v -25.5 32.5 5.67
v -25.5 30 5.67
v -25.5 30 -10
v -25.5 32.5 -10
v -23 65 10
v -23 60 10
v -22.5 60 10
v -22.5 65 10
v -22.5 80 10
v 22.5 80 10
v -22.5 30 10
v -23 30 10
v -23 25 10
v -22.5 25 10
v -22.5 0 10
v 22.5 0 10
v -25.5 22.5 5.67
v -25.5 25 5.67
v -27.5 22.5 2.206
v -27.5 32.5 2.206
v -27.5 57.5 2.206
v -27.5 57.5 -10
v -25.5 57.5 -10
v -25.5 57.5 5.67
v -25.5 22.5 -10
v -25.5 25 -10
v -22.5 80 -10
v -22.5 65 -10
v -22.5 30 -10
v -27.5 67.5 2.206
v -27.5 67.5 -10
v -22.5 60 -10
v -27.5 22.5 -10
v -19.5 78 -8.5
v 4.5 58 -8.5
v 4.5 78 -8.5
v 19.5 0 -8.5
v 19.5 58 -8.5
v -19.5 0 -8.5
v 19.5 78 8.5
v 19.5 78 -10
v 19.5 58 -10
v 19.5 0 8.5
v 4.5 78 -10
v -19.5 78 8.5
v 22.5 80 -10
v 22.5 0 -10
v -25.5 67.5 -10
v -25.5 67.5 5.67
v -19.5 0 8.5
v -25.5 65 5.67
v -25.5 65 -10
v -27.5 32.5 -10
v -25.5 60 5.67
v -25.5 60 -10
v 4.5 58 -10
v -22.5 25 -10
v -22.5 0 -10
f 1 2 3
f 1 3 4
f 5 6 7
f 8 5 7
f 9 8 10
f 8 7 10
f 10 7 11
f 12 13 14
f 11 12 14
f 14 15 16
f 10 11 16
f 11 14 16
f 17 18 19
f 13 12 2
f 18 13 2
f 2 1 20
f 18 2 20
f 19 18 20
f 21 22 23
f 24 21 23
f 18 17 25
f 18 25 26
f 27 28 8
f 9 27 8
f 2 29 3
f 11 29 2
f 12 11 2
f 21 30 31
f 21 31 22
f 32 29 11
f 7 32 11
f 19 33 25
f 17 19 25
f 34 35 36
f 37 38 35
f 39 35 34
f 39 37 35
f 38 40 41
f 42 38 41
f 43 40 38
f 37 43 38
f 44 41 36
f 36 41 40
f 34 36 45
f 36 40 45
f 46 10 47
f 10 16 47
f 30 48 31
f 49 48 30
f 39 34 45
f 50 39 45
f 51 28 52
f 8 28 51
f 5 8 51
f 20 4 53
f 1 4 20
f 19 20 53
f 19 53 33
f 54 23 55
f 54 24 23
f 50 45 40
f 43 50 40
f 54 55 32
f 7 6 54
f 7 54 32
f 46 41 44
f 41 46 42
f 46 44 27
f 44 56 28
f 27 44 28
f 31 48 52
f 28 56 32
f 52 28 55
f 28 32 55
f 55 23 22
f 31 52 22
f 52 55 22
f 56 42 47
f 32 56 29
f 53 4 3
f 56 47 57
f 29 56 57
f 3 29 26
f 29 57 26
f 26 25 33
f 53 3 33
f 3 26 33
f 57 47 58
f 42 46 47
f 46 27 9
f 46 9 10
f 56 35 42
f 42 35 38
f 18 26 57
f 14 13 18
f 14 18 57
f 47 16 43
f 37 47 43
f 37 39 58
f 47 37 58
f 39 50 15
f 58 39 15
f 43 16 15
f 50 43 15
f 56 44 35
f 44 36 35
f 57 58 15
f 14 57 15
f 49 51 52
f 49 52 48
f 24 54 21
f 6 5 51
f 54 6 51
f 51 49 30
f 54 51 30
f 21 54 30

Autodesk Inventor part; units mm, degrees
ref_plane "YZ Plane" through (0, 0, 0) normal (1, 0, 0) x (0, 1, 0)
sketch "スケッチ1" plane through (0, 0, 0) normal (0, 1, 0) x (-1, 0, 0)
  line L0 (-22.5, -10) -> (22.5, -10)
  line L1 (22.5, -10) -> (22.5, 10)
  line L2 (22.5, 10) -> (-22.5, 10)
  line L3 (-22.5, 10) -> (-22.5, -10)
  line L4 (-22.5, -10) -> (22.5, 10) construction
  line L5 (22.5, -10) -> (-22.5, 10) construction
  point P0 (0, 0)
  dimension "d0" = 45
  dimension "d1" = 20
extrude "押し出し1" add sketch "スケッチ1" along normal blind 90
sketch "スケッチ2" plane through (-22.5, 0, 10) normal (0, 0, 1) x (1, 0, 0)
  line L0 (0, 0) -> (0, 90) projected
  line L1 (0, 65) -> (-3, 65)
  line L2 (-3, 65) -> (-3, 60)
  line L3 (-3, 60) -> (0, 60)
  line L4 (0, 60) -> (0, 65)
  line L5 (-3, 67.5) -> (-5, 67.5)
  line L6 (-5, 67.5) -> (-5, 57.5)
  line L7 (-5, 57.5) -> (-3, 57.5)
  line L8 (-3, 57.5) -> (-3, 67.5)
  line L9 (0, 90) -> (45, 90) projected
  point P0 (22.5, 0)
  point P1 (-5, 62.5)
  point P2 (-3, 62.5)
  point P3 (-3, 60)
  point P4 (0, 60)
  point P5 (-3, 65)
  dimension "d14" = 5
  dimension "d15" = 10
  dimension "d16" = 2
  dimension "d17" = 3
  dimension "d18" = 25
ref_plane "作業平面1" through (0, 45, 0) normal (0, 1, 0) x (1, 0, 0)
extrude "押し出し2" add sketch "スケッチ2" against normal up to surface (20 mm away)
mirror "ミラー1" about plane through (0, 45, 0) normal (0, 1, 0) of "押し出し2"
sketch "スケッチ3" plane through (-27.5, 67.5, 10) normal (0, 1, 0) x (1, 0, 0)
  line L0 (4.5, 0) -> (-25.5, 51.9615) projected
  line L1 (2, 20) -> (0, 20) projected
  line L2 (0, 0) -> (0, 20) projected
  line L3 (2, 0) -> (0, 0) projected
  line L4 (2, 0) -> (2, 20) projected
  line L5 (5, 20) -> (2, 20) projected
  line L6 (2, 0) -> (2, 20) projected
  line L7 (5, 0) -> (2, 0) projected
  line L8 (5, 20) -> (5, 0) projected
  point P0 (27.5, 10)
  point P1 (4.5, 0)
  point P2 (0, 7.7942)
extrude "押し出し3" cut sketch "スケッチ3" against normal through all contours L7 L4 L0 | L4 L3 L2 L0
sketch "スケッチ4" plane through (22.5, 0, 10) normal (1, 0, 0) x (0, 0, -1)
  line L0 (6.75, 92.2249) -> (6.75, 87.9989) projected
  line L1 (6.75, 87.9989) -> (1.25, 90.7989) projected
  line L2 (1.25, 92.2249) -> (1.25, 90.7989) projected
  line L3 (20, 90) -> (0, 90) projected
  line L4 (6.95, 90) -> (6.95, 87.7989)
  line L5 (6.95, 87.7989) -> (0, 87.7989)
  line L6 (0, 0) -> (0, 90) projected
  line L7 (0, 90) -> (20, 90) projected
  arc A0 (7.95, 90) -> (20, 90.2989) centre (12.7443, 139.7696) ccw
  line L8 (20, 0) -> (20, 90) projected
  point P0 (10, 0)
  point P1 (7.95, 90)
  point P2 (17.5386, 90)
  dimension "d26" = 0.2
  dimension "d27" = 0.2
  dimension "d28" = 50
  dimension "d29" = 1
  dimension "d32" = 2.5
extrude "押し出し4" cut sketch "スケッチ4" against normal through all
sketch "スケッチ5" plane through (22.5, 87.7989, 3.05) normal (0, 0, 1) x (1, 0, 0)
  line L0 (-36.25, 2.2011) -> (-36.25, 5.1444)
  line L1 (-30.25, 3.7011) -> (-30.25, 2.2011)
  line L2 (-24.85, 7.7011) -> (-24.85, 2.2011)
  line L3 (-20.65, 2.2011) -> (-20.65, 7.7011)
  line L4 (-24.85, 7.7011) -> (-24.85, 2.2011)
  line L5 (-15.25, 2.2011) -> (-15.25, 3.7011)
  line L6 (-9.25, 9.2011) -> (-9.25, 6.2579)
  line L7 (0, 0) -> (-45, 0)
  line L8 (-36.25, 2.2011) -> (-45, 2.2011)
  line L9 (-45, 2.2011) -> (-45, 0)
  line L10 (-45, 0) -> (-36.25, 0)
  line L11 (-36.25, 0) -> (-36.25, 2.2011)
  line L12 (-30.25, 2.2011) -> (-24.85, 2.2011)
  line L13 (-24.85, 2.2011) -> (-24.85, 0)
  line L14 (-24.85, 0) -> (-30.25, 0)
  line L15 (-30.25, 0) -> (-30.25, 2.2011)
  line L16 (-20.65, 2.2011) -> (-15.25, 2.2011)
  line L17 (-15.25, 2.2011) -> (-15.25, 0)
  line L18 (-15.25, 0) -> (-20.65, 0)
  line L19 (-20.65, 0) -> (-20.65, 2.2011)
  line L20 (-9.25, 6.2579) -> (0, 6.2579)
  line L21 (0, 6.2579) -> (0, 0)
  line L22 (0, 0) -> (-9.25, 0)
  line L23 (-9.25, 0) -> (-9.25, 6.2579)
  point P0 (-22.5, -87.7989)
  point P1 (-9.25, 0)
extrude "押し出し5" add sketch "スケッチ5" along normal up to surface (6.95 mm away)
sketch "スケッチ6" plane through (0, 0, 0) normal (0, -1, 0) x (1, 0, 0)
  line L0 (19.5, -8.5) -> (-19.5, -8.5)
  line L1 (-19.5, -8.5) -> (-19.5, 8.5)
  line L2 (-19.5, 8.5) -> (19.5, 8.5)
  line L3 (19.5, 8.5) -> (19.5, -8.5)
  line L4 (19.5, -8.5) -> (-19.5, 8.5) construction
  line L5 (-19.5, -8.5) -> (19.5, 8.5) construction
  point P0 (0, 0)
  dimension "d35" = 39
  dimension "d36" = 17
extrude "押し出し6" cut sketch "スケッチ6" against normal blind 78
sketch "スケッチ7" plane through (-19.5, 0, -8.5) normal (0, 0, 1) x (1, 0, 0)
  line L0 (39, 0) -> (0, 0) projected
  line L1 (39, 0) -> (39, 78) projected
  line L2 (39, 78) -> (0, 78) projected
  line L3 (0, 0) -> (0, 78) projected
  line L4 (39, 78) -> (24, 78)
  line L5 (24, 78) -> (24, 58)
  line L6 (24, 58) -> (39, 58)
  line L7 (39, 58) -> (39, 78)
  point P0 (19.5, 0)
  dimension "d39" = 15
  dimension "d40" = 20
extrude "押し出し7" cut sketch "スケッチ7" against normal through all contours L6 L5 L2 L1
sketch "スケッチ8" plane through (13.25, 94.0568, 3.05) normal (0, 1, 0) x (1, 0, 0)
  line L0 (9.25, 0) -> (9.25, -6.95) projected
  line L1 (9.25, -6.95) -> (-35.75, -6.95)
  line L2 (-35.75, -6.95) -> (-35.75, 13.05)
  line L3 (-35.75, 13.05) -> (9.25, 13.05)
  line L4 (9.25, 13.05) -> (9.25, -6.95)
  point P0 (-13.25, 3.05)
ref_plane "作業平面2" through (0, 80, 0) normal (0, -1, 0) x (1, 0, 0)
extrude "押し出し8" cut sketch "スケッチ8" against normal up to surface (14.0568 mm away)
equation "\"d27\" = d26"
properties part number "battery"
